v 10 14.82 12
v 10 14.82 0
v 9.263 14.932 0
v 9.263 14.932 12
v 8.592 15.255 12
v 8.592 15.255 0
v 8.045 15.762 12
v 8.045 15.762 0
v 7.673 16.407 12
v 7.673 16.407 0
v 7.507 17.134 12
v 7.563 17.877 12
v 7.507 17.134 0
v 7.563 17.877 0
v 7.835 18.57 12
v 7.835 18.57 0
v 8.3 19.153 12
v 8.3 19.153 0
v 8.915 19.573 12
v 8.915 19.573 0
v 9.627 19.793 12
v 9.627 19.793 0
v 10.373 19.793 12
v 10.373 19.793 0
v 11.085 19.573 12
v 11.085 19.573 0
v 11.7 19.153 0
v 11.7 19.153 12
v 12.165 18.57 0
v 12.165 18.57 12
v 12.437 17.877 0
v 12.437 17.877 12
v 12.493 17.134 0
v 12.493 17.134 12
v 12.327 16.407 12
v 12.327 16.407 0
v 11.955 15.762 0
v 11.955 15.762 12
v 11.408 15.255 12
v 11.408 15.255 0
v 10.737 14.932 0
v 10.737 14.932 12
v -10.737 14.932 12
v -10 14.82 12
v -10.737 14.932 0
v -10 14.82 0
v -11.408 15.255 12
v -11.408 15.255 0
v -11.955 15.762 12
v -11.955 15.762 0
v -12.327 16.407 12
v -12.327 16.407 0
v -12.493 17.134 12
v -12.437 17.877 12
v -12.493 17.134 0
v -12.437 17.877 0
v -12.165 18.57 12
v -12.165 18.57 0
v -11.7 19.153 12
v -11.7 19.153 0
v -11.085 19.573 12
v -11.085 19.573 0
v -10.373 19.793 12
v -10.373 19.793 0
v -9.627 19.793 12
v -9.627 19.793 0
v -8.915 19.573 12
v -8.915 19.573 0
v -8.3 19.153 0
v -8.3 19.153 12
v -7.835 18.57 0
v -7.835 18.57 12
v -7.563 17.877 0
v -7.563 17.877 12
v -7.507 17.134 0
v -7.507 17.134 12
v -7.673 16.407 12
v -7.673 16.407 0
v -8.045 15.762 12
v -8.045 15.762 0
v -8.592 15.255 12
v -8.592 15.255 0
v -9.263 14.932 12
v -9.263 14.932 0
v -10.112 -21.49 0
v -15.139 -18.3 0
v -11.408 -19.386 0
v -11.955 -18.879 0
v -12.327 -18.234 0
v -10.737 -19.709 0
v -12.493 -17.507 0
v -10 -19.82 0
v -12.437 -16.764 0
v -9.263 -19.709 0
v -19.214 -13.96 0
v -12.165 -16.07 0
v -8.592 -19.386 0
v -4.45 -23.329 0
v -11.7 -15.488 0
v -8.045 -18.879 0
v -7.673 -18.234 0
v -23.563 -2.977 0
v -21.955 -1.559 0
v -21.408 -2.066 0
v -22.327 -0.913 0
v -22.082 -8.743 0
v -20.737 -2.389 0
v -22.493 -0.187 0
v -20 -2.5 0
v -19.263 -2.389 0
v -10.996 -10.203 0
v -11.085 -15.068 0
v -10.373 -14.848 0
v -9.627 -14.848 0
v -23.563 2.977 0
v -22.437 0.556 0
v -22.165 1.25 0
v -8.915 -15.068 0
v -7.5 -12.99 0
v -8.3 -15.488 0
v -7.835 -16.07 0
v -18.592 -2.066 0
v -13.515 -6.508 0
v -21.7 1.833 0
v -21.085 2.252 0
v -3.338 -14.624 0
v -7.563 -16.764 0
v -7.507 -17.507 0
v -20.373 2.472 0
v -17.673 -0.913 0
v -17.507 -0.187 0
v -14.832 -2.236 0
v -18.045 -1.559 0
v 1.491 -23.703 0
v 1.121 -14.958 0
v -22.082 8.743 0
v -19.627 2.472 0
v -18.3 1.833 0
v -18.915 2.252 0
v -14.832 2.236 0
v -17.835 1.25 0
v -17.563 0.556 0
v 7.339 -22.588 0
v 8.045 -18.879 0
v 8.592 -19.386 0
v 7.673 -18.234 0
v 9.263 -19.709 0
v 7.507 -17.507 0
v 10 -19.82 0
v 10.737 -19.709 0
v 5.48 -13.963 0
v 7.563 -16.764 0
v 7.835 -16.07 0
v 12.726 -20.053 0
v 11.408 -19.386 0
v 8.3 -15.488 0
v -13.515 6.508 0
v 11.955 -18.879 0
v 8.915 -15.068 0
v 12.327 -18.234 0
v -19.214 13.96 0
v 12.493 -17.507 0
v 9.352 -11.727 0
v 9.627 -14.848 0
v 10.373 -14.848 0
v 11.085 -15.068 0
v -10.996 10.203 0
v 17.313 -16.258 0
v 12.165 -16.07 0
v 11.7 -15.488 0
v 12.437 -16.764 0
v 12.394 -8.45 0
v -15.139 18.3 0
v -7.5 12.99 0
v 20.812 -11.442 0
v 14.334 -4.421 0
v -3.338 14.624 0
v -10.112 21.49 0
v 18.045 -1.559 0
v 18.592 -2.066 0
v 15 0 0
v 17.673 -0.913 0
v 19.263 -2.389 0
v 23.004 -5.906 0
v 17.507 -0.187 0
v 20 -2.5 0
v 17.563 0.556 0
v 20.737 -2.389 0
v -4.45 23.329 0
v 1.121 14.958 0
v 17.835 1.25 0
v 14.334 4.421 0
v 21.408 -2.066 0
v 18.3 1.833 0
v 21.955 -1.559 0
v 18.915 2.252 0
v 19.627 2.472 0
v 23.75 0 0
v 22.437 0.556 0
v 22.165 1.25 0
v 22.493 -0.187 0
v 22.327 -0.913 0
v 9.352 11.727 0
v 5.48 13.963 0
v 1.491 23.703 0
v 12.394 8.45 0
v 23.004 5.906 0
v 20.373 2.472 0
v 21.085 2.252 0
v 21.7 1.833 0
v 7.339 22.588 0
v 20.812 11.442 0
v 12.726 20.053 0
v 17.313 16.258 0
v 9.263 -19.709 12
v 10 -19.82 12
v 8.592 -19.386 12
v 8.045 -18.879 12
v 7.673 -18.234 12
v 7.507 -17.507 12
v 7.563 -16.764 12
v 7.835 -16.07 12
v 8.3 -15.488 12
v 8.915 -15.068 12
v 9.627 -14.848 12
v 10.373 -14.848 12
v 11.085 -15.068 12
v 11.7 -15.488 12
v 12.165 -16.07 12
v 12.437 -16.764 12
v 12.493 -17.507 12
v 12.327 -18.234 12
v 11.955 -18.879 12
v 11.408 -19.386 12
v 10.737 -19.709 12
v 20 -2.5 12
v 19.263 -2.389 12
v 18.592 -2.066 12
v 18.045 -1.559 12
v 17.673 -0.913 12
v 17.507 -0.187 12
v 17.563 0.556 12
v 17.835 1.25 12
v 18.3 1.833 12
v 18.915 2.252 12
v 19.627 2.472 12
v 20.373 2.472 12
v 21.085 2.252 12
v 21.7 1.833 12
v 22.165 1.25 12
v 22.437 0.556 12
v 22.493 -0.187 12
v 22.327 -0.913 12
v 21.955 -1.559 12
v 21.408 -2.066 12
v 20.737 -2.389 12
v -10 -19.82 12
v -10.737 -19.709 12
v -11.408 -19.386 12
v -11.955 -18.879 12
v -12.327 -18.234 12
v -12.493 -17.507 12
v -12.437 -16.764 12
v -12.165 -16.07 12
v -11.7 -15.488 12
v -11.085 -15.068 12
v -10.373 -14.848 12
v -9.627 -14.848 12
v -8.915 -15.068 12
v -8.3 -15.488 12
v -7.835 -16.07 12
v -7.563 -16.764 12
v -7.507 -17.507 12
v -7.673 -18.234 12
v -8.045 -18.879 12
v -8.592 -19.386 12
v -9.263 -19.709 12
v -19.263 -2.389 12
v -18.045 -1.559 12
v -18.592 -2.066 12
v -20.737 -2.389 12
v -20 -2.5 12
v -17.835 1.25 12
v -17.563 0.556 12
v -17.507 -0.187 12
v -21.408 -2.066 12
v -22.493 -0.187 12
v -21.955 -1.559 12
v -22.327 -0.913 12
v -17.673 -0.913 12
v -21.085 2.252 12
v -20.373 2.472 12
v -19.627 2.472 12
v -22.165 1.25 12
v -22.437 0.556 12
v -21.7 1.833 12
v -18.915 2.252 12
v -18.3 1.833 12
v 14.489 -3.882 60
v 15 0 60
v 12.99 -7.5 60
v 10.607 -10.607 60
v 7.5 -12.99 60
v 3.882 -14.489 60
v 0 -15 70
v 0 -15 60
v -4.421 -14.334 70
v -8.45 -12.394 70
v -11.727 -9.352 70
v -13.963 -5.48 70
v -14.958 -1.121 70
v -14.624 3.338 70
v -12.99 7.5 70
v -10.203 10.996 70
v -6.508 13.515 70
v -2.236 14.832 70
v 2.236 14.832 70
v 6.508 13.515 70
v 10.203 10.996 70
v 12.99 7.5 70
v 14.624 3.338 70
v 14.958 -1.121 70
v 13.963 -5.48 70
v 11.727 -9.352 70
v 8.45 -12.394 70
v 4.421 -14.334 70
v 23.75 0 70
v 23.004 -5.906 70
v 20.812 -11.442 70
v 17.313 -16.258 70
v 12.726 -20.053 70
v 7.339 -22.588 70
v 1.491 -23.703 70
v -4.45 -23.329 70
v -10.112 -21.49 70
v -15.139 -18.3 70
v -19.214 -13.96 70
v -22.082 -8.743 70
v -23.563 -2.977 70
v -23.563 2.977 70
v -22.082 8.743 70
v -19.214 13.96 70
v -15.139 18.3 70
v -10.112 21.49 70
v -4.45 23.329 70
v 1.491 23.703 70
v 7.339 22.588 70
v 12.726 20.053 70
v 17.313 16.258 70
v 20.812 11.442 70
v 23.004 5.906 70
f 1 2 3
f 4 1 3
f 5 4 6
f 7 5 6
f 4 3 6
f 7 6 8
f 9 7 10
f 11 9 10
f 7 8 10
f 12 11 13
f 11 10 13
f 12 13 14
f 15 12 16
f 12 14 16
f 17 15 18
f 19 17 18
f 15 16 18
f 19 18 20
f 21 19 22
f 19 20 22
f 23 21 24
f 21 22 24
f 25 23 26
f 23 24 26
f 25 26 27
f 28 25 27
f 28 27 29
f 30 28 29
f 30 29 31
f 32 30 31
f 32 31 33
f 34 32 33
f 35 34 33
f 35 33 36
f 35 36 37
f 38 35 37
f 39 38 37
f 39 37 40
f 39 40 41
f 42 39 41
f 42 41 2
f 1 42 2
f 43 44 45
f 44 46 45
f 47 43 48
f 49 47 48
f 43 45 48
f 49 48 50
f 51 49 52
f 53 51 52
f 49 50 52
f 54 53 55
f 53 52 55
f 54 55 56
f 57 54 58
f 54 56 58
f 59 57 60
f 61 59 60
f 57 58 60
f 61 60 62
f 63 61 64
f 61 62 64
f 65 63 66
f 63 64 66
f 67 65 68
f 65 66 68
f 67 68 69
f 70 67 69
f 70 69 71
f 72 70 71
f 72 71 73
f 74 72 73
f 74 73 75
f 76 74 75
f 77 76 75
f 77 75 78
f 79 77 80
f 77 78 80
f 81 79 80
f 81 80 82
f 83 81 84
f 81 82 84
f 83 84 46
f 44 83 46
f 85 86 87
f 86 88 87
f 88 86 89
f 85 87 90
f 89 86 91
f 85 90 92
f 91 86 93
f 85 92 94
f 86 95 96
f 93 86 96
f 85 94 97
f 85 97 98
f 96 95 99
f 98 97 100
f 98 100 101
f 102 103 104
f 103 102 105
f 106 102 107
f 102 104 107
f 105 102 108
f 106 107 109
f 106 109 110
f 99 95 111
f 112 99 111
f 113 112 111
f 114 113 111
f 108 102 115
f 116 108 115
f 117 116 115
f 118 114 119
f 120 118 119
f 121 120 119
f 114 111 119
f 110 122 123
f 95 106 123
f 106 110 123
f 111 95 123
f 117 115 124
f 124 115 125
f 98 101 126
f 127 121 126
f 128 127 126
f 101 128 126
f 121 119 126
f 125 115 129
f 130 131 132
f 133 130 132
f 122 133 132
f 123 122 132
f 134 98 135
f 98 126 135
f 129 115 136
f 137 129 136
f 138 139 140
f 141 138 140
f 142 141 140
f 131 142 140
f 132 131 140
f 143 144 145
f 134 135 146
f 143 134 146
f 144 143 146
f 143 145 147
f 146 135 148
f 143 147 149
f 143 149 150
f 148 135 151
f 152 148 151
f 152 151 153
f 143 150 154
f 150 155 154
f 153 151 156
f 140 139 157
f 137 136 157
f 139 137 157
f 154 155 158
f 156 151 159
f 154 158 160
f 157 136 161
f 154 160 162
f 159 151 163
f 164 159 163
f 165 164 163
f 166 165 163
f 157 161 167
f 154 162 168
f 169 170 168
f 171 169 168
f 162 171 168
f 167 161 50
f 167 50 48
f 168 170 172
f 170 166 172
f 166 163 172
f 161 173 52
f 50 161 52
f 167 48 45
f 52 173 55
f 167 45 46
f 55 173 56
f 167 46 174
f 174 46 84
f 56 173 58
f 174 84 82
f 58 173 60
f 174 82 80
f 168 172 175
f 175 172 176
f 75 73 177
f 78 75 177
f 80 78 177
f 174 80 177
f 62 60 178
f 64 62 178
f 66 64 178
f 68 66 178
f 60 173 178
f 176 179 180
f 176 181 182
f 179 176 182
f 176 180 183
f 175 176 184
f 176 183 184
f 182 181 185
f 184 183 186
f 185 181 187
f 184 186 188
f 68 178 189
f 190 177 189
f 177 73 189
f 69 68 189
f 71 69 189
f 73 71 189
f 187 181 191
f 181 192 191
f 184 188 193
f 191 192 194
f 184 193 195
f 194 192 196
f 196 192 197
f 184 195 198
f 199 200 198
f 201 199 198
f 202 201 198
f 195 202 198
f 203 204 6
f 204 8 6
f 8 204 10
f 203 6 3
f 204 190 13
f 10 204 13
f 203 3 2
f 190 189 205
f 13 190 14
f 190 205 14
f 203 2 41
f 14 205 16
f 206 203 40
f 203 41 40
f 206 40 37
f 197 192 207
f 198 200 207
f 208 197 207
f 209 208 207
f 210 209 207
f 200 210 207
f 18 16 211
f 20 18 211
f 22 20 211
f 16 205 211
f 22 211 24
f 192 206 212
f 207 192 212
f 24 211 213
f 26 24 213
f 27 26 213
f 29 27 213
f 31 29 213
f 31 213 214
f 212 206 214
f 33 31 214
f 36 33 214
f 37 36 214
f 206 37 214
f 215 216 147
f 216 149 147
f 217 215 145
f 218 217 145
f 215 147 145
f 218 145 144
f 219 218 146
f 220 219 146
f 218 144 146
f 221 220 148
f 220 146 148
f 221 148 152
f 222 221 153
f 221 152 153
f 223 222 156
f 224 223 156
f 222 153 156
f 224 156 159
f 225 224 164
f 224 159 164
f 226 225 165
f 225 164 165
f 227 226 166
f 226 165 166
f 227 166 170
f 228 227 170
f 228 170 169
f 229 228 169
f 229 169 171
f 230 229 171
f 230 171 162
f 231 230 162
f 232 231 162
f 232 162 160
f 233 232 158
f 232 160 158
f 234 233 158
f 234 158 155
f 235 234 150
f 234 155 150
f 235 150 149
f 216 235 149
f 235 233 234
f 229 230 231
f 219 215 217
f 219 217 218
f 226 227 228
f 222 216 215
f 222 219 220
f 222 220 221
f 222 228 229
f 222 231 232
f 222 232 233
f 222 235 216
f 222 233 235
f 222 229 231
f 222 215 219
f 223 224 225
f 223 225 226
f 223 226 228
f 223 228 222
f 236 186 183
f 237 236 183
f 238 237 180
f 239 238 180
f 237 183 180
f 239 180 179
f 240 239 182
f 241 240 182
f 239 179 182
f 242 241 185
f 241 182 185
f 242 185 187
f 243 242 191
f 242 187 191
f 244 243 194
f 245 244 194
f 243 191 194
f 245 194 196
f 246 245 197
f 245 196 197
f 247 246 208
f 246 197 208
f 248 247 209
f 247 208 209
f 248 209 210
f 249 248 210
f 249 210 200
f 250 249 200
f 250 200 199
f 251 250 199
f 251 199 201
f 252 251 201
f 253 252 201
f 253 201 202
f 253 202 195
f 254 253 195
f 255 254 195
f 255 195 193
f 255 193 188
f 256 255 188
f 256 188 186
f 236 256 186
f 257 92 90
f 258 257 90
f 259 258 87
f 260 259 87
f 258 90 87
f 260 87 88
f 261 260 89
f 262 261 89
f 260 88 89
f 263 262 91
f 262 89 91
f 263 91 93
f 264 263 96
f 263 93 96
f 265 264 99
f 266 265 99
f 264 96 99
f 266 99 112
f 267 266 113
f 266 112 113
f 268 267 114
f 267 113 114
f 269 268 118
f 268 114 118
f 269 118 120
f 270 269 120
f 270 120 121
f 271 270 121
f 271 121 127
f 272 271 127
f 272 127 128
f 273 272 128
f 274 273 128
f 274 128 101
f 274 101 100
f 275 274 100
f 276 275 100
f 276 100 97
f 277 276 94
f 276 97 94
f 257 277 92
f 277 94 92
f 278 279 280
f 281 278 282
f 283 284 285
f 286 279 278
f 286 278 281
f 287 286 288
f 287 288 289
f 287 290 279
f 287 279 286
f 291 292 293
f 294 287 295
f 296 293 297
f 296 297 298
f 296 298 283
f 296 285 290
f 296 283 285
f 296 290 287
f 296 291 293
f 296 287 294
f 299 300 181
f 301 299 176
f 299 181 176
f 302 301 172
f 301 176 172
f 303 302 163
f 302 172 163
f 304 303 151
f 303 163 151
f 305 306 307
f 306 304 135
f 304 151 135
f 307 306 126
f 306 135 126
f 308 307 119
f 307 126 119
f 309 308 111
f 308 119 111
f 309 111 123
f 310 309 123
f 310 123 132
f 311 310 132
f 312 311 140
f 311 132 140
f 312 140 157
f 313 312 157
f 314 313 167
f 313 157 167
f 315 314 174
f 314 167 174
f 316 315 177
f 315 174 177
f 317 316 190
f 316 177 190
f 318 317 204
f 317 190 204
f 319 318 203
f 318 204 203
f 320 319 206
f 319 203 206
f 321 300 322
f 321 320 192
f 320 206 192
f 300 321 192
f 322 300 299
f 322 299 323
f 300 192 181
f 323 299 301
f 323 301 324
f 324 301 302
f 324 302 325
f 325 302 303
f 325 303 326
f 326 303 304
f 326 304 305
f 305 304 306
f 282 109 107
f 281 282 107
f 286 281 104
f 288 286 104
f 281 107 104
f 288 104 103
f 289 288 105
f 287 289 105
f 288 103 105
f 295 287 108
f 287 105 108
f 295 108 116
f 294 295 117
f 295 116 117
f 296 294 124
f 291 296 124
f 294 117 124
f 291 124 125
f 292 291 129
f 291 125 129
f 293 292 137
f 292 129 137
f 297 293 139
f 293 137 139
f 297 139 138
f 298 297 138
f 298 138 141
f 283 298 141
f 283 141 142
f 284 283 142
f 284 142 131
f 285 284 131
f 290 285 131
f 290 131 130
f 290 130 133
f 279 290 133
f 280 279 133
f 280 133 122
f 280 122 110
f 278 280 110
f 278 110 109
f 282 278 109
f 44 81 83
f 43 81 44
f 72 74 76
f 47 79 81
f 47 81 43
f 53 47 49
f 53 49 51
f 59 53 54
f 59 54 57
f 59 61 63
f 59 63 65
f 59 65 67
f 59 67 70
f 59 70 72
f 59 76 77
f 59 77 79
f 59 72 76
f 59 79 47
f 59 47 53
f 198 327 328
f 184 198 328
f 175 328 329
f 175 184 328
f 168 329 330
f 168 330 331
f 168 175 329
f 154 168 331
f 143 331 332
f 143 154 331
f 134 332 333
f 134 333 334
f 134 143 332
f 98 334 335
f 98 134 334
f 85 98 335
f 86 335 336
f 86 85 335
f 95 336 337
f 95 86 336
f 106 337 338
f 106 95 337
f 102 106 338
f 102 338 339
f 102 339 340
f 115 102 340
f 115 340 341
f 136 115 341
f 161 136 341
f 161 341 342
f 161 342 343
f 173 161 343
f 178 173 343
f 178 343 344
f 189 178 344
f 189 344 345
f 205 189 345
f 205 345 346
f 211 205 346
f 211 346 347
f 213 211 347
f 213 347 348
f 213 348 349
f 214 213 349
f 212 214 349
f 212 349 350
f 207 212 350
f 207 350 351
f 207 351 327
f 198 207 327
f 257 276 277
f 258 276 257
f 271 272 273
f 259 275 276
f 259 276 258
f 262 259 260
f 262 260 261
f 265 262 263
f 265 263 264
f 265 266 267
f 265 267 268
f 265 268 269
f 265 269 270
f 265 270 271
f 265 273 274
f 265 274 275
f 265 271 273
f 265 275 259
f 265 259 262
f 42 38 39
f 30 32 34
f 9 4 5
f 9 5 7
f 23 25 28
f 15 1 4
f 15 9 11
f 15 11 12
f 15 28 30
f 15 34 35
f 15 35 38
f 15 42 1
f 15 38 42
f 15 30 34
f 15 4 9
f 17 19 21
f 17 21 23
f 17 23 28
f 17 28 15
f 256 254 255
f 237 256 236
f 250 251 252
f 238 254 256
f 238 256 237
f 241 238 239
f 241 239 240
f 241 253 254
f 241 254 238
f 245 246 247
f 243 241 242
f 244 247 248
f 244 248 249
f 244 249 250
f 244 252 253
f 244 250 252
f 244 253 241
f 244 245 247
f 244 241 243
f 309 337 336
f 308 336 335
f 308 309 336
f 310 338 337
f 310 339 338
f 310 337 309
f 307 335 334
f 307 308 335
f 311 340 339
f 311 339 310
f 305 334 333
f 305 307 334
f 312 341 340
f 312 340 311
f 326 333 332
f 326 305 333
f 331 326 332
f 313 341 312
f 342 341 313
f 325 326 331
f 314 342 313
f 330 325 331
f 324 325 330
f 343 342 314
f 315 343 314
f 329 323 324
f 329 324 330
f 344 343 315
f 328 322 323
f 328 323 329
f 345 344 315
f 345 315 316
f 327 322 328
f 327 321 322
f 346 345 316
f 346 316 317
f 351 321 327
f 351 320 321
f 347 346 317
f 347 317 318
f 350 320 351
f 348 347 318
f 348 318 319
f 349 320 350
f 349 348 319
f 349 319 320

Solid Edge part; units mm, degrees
sketch "Sketch1" plane through (0, 0, 0) normal (0, 0, 1) x (1, 0, 0)
  circle A0 centre (0, 0) radius 25
extrude "Protrusion1" add sketch "Sketch1" along normal blind 70
sketch "Sketch2" plane through (0, 0, 0) normal (0, 0, -1) x (0, -1, 0)
  circle A0 centre (0, 20) radius 2.5
  circle A1 centre (17.3205, 10) radius 2.5
  circle A2 centre (17.3205, -10) radius 2.5
  circle A3 centre (0, -20) radius 2.5
  circle A4 centre (-17.3205, -10) radius 2.5
  circle A5 centre (-17.3205, 10) radius 2.5
extrude "ExtrudedCutout_1" cut sketch "Sketch2" against normal blind 12
sketch "Sketch3" plane through (0, 0, 0) normal (0, 0, -1) x (1, 0, 0)
  circle A0 centre (0, 0) radius 15
extrude "ExtrudedCutout_3" cut sketch "Sketch3" against normal blind 60
sketch "Sketch4" plane through (0, 0, 0) normal (0, 0, -1) x (0, -1, 0)
  circle A0 centre (0, 0) radius 15
extrude "ExtrudedCutout_4" cut sketch "Sketch4" against normal blind 70
sketch "Sketch5" plane through (0, 0, 0) normal (0, 0, -1) x (1, 0, 0)
  circle A0 centre (0, 0) radius 23.75
  circle A1 centre (0, 0) radius 25
extrude "Cutout1" cut sketch "Sketch5" against normal up to vertex (70 mm away)
